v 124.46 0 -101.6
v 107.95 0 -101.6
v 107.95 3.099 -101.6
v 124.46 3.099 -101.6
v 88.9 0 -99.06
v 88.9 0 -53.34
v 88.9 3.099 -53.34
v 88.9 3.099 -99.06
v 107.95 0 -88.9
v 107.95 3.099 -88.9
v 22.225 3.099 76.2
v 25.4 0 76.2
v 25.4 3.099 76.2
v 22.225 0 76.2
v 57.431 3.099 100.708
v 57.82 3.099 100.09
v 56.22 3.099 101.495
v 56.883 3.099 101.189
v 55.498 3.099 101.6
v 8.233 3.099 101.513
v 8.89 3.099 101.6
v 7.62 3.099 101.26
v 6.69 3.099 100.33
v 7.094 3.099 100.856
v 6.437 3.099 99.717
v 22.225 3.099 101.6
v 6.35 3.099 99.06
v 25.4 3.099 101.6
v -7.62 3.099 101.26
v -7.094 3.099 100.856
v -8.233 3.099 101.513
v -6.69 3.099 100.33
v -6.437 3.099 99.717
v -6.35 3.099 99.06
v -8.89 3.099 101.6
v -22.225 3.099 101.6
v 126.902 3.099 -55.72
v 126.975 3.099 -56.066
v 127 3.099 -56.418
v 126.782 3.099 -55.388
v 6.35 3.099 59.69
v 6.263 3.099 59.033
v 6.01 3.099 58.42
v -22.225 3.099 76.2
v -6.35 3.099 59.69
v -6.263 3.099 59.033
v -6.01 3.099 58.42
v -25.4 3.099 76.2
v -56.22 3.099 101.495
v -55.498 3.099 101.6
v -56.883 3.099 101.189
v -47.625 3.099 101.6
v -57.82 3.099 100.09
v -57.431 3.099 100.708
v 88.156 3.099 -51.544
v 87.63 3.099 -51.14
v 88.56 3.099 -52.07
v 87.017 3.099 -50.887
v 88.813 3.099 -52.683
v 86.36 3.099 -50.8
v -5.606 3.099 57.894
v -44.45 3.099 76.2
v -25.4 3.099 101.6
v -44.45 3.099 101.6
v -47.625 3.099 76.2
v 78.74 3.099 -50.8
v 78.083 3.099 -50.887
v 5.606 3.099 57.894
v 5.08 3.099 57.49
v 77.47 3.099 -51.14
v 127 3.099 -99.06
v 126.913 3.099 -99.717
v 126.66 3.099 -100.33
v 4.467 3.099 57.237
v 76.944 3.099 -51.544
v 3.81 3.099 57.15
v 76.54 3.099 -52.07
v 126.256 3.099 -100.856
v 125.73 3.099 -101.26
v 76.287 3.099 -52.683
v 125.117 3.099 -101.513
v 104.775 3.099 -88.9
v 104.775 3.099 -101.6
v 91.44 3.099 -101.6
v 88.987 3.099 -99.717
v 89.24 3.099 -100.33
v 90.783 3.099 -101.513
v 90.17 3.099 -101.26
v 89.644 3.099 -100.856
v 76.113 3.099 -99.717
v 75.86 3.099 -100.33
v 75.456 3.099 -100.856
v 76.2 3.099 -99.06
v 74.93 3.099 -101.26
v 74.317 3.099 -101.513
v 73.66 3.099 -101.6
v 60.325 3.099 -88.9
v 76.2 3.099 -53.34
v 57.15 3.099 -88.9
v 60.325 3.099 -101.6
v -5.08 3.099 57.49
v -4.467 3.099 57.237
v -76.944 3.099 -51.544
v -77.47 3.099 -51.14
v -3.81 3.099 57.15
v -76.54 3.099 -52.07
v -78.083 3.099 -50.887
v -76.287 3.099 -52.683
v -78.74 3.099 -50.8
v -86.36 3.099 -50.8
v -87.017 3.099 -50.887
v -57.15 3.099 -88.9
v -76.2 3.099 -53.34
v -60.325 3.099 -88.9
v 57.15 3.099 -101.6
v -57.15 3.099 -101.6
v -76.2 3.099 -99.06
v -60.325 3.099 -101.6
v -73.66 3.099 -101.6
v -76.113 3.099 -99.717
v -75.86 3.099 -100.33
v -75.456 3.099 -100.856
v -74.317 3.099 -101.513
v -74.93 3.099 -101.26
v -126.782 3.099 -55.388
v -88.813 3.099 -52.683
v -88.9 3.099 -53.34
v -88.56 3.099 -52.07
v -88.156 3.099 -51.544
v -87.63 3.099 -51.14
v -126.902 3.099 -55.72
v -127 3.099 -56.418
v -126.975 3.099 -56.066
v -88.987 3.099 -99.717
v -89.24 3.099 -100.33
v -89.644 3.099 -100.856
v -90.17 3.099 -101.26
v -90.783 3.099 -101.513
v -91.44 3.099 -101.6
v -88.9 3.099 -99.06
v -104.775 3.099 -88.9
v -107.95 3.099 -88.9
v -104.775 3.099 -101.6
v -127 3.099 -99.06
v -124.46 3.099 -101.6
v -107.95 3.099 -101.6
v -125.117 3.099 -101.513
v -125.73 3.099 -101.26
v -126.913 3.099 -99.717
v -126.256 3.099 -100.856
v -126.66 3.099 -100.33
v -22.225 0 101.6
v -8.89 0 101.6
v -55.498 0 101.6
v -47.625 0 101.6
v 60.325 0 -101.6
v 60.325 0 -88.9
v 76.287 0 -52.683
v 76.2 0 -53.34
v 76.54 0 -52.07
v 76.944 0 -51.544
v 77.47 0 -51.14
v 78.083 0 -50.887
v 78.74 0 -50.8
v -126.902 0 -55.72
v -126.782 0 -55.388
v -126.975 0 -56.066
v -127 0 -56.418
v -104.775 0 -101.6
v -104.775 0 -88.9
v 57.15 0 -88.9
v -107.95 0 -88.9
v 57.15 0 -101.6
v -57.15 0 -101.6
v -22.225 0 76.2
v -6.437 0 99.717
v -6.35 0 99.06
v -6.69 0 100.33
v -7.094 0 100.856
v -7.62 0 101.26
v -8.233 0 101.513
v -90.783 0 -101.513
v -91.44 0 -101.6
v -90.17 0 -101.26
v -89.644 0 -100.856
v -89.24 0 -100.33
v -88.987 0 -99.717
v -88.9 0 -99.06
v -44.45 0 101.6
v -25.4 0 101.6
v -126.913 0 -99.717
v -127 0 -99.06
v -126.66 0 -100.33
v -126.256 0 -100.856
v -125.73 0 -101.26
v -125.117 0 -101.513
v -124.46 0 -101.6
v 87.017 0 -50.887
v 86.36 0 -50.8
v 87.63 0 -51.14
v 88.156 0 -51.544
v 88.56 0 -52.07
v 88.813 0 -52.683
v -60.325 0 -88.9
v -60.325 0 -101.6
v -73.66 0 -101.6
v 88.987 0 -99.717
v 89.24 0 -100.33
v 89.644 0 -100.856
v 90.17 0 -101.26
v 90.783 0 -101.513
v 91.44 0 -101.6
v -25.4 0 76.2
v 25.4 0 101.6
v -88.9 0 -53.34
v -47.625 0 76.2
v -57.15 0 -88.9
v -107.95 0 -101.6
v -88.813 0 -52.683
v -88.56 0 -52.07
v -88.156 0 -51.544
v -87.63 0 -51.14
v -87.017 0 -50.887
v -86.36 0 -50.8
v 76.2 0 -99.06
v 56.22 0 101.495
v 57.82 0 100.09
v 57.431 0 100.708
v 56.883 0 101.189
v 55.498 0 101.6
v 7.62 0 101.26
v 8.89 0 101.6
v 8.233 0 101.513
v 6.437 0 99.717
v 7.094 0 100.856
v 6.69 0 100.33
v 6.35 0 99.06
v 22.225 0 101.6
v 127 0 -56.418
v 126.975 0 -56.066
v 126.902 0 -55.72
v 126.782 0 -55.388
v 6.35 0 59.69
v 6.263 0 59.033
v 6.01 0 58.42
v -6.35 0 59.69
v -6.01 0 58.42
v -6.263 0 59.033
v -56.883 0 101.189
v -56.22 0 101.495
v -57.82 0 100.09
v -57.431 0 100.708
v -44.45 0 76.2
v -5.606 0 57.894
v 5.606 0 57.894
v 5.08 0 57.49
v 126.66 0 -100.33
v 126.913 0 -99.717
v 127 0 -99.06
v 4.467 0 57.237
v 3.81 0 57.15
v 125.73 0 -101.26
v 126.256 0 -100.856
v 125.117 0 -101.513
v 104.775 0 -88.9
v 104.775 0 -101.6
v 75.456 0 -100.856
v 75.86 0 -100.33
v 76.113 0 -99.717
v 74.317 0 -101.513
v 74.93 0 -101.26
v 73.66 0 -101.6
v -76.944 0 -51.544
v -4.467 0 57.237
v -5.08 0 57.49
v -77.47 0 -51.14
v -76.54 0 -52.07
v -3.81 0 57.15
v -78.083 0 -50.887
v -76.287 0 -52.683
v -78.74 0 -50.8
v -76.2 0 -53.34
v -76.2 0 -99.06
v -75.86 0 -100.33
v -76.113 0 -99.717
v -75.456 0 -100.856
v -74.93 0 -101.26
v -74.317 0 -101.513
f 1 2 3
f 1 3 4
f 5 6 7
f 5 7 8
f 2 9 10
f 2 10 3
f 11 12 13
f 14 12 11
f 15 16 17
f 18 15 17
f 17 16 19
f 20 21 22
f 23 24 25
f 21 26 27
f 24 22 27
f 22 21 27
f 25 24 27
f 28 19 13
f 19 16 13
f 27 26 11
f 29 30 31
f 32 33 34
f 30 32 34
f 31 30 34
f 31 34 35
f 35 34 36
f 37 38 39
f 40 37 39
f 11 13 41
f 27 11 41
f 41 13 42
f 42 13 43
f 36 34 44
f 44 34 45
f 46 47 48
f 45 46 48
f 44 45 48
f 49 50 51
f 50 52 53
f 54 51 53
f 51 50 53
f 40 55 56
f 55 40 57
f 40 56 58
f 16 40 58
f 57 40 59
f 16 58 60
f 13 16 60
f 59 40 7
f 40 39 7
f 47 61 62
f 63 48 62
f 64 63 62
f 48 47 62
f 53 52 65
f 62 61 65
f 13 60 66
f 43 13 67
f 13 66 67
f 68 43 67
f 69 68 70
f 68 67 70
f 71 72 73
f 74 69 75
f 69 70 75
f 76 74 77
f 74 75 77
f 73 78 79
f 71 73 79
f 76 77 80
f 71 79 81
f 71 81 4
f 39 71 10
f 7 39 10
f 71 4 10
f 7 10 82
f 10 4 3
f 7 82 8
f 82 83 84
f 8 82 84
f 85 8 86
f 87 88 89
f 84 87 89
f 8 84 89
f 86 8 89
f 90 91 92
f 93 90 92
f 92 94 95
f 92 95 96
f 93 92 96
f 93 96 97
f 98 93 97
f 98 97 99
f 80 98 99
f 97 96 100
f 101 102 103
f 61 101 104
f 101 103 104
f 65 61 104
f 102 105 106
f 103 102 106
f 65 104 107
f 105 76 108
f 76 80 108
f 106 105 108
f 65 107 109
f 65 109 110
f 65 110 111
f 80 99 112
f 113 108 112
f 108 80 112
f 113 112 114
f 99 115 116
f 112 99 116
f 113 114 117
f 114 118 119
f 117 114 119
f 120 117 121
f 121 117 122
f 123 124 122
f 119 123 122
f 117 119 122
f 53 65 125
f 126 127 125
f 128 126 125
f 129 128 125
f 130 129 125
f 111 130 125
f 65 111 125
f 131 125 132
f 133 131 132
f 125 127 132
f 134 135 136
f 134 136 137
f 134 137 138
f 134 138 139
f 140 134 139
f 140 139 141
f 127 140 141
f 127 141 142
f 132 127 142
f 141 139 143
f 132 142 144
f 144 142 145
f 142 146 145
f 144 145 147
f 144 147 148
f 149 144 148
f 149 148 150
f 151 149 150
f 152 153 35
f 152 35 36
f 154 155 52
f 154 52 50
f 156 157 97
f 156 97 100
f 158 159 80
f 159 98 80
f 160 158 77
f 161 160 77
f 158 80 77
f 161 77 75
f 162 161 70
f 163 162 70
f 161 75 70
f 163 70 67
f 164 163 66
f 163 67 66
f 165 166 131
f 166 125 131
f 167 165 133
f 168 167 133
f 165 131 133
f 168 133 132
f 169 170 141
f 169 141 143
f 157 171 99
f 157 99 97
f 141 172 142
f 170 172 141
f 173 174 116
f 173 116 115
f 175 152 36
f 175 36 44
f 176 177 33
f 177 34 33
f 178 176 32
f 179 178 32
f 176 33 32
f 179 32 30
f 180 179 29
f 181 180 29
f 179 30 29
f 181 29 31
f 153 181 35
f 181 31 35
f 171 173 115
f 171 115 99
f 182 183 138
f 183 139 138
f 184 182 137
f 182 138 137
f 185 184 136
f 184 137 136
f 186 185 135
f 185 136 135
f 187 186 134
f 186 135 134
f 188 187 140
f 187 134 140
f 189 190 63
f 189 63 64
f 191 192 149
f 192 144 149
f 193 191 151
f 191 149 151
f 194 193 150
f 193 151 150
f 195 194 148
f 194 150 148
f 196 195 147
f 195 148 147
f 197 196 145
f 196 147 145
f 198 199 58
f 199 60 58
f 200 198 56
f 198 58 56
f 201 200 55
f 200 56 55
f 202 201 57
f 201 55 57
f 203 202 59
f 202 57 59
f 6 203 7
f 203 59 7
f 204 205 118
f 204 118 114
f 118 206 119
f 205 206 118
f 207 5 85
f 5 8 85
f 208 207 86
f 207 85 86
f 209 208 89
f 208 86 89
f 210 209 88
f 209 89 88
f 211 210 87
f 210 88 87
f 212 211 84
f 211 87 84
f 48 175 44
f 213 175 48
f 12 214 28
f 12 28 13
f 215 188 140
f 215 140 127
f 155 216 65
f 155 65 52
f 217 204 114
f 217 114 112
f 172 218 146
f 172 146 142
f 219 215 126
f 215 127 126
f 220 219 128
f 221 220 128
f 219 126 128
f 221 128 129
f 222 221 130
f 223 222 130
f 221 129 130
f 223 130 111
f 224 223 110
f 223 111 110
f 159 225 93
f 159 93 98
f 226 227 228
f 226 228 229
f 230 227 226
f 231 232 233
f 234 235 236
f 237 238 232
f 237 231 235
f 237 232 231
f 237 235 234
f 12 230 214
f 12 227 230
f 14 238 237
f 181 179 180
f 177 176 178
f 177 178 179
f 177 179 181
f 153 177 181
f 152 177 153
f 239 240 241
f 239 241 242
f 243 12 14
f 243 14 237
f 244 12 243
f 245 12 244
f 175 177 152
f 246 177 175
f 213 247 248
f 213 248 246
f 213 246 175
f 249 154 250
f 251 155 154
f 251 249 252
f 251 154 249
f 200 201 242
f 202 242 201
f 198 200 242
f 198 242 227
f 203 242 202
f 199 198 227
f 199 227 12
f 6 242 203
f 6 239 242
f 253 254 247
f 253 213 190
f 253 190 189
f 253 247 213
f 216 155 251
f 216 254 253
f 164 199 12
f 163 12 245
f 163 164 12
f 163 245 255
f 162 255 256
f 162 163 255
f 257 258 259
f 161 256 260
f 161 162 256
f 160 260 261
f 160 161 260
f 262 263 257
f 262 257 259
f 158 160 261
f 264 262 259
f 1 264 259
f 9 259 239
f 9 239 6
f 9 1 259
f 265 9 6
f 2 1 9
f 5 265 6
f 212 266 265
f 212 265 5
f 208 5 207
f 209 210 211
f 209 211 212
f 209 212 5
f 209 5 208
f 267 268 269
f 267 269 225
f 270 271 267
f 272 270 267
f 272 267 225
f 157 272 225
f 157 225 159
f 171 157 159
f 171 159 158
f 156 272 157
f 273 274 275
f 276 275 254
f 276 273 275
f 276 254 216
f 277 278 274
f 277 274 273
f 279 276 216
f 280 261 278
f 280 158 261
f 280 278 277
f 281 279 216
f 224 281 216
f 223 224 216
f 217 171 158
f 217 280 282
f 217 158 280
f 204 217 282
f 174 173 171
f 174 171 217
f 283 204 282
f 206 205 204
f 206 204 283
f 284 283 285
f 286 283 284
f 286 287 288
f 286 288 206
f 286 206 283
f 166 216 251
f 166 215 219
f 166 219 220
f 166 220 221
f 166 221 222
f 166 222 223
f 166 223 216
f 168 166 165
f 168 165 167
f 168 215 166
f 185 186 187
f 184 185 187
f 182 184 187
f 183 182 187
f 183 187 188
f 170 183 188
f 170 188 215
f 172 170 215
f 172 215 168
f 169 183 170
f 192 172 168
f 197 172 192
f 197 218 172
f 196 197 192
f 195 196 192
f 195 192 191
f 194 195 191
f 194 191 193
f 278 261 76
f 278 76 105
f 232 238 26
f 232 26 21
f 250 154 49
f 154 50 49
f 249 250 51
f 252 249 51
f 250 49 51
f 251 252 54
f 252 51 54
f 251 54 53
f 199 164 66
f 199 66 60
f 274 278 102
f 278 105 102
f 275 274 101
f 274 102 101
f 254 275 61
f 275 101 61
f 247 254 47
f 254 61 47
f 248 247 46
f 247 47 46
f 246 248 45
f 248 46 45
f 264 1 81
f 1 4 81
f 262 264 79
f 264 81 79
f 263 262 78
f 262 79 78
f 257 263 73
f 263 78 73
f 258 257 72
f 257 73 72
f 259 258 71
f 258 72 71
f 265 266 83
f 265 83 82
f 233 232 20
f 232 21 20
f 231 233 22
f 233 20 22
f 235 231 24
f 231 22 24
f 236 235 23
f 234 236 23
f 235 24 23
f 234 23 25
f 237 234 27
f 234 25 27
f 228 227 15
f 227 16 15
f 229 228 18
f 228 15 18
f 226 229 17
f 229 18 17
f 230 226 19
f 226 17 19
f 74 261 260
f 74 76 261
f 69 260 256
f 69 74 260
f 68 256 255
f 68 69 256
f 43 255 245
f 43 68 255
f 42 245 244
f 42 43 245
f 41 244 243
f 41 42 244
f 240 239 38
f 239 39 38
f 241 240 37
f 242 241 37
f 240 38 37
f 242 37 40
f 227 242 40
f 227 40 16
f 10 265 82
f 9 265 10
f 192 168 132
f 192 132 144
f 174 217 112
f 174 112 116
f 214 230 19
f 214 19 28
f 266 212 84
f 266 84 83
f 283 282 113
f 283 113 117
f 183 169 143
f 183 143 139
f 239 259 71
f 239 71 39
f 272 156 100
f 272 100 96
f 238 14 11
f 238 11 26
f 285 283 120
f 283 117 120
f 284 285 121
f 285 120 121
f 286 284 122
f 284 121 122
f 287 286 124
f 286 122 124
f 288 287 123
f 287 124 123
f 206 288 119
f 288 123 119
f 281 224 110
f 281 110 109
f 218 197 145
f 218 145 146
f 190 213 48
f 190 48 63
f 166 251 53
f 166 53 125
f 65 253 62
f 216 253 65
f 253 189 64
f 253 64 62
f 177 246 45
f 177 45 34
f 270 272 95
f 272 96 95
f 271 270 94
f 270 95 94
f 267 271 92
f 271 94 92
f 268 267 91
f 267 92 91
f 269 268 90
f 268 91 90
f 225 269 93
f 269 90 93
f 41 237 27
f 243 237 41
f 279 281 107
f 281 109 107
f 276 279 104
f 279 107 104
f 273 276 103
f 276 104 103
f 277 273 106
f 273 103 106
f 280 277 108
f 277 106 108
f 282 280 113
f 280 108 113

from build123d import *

# Parameters (mm, degrees)
BOSS_EXTRUDE1_DEPTH = 3.0988
FILLET1_R           = 2.54


with BuildPart() as part:
    # Sketch1 → Boss-Extrude1 (new body)
    with BuildSketch(Plane(origin=(0, 0, 0), x_dir=(1, 0, 0), z_dir=(0, 1, 0))):
        Polygon((6.35, -57.15), (-6.35, -57.15), (-6.35, -101.6), (-22.225, -101.6), (-22.225, -76.2), (-25.4, -76.2), (-25.4, -101.6), (-44.45, -101.6), (-44.45, -76.2), (-47.625, -76.2), (-47.625, -101.6), (-57.15, -101.6), (-127, 55.88), (-127, 101.6), (-107.95, 101.6), (-107.95, 88.9), (-104.775, 88.9), (-104.775, 101.6), (-88.9, 101.6), (-88.9, 50.8), (-76.2, 50.8), (-76.2, 101.6), (-60.325, 101.6), (-60.325, 88.9), (-57.15, 88.9), (-57.15, 101.6), (57.15, 101.6), (57.15, 88.9), (60.325, 88.9), (60.325, 101.6), (76.2, 101.6), (76.2, 50.8), (88.9, 50.8), (88.9, 101.6), (104.775, 101.6), (104.775, 88.9), (107.95, 88.9), (107.95, 101.6), (127, 101.6), (127, 55.88), (57.15, -101.6), (25.4, -101.6), (25.4, -76.2), (22.225, -76.2), (22.225, -101.6), (6.35, -101.6), align=None)
    extrude(amount=BOSS_EXTRUDE1_DEPTH)

    # Fillet1
    fillet1_edges = [part.edges().sort_by_distance(p)[0] for p in [
        (88.9, 1.5494, -50.8),
        (88.9, 1.5494, -101.6),
        (127, 1.5494, -101.6),
        (127, 1.5494, -55.88),
        (57.15, 1.5494, 101.6),
        (6.35, 1.5494, 101.6),
        (6.35, 1.5494, 57.15),
        (-6.35, 1.5494, 57.15),
        (-6.35, 1.5494, 101.6),
        (-57.15, 1.5494, 101.6),
        (-127, 1.5494, -55.88),
        (-127, 1.5494, -101.6),
        (-88.9, 1.5494, -101.6),
        (-88.9, 1.5494, -50.8),
        (-76.2, 1.5494, -50.8),
        (-76.2, 1.5494, -101.6),
        (76.2, 1.5494, -101.6),
        (76.2, 1.5494, -50.8),
    ]]
    fillet(fillet1_edges, radius=FILLET1_R)


solid = part.part
